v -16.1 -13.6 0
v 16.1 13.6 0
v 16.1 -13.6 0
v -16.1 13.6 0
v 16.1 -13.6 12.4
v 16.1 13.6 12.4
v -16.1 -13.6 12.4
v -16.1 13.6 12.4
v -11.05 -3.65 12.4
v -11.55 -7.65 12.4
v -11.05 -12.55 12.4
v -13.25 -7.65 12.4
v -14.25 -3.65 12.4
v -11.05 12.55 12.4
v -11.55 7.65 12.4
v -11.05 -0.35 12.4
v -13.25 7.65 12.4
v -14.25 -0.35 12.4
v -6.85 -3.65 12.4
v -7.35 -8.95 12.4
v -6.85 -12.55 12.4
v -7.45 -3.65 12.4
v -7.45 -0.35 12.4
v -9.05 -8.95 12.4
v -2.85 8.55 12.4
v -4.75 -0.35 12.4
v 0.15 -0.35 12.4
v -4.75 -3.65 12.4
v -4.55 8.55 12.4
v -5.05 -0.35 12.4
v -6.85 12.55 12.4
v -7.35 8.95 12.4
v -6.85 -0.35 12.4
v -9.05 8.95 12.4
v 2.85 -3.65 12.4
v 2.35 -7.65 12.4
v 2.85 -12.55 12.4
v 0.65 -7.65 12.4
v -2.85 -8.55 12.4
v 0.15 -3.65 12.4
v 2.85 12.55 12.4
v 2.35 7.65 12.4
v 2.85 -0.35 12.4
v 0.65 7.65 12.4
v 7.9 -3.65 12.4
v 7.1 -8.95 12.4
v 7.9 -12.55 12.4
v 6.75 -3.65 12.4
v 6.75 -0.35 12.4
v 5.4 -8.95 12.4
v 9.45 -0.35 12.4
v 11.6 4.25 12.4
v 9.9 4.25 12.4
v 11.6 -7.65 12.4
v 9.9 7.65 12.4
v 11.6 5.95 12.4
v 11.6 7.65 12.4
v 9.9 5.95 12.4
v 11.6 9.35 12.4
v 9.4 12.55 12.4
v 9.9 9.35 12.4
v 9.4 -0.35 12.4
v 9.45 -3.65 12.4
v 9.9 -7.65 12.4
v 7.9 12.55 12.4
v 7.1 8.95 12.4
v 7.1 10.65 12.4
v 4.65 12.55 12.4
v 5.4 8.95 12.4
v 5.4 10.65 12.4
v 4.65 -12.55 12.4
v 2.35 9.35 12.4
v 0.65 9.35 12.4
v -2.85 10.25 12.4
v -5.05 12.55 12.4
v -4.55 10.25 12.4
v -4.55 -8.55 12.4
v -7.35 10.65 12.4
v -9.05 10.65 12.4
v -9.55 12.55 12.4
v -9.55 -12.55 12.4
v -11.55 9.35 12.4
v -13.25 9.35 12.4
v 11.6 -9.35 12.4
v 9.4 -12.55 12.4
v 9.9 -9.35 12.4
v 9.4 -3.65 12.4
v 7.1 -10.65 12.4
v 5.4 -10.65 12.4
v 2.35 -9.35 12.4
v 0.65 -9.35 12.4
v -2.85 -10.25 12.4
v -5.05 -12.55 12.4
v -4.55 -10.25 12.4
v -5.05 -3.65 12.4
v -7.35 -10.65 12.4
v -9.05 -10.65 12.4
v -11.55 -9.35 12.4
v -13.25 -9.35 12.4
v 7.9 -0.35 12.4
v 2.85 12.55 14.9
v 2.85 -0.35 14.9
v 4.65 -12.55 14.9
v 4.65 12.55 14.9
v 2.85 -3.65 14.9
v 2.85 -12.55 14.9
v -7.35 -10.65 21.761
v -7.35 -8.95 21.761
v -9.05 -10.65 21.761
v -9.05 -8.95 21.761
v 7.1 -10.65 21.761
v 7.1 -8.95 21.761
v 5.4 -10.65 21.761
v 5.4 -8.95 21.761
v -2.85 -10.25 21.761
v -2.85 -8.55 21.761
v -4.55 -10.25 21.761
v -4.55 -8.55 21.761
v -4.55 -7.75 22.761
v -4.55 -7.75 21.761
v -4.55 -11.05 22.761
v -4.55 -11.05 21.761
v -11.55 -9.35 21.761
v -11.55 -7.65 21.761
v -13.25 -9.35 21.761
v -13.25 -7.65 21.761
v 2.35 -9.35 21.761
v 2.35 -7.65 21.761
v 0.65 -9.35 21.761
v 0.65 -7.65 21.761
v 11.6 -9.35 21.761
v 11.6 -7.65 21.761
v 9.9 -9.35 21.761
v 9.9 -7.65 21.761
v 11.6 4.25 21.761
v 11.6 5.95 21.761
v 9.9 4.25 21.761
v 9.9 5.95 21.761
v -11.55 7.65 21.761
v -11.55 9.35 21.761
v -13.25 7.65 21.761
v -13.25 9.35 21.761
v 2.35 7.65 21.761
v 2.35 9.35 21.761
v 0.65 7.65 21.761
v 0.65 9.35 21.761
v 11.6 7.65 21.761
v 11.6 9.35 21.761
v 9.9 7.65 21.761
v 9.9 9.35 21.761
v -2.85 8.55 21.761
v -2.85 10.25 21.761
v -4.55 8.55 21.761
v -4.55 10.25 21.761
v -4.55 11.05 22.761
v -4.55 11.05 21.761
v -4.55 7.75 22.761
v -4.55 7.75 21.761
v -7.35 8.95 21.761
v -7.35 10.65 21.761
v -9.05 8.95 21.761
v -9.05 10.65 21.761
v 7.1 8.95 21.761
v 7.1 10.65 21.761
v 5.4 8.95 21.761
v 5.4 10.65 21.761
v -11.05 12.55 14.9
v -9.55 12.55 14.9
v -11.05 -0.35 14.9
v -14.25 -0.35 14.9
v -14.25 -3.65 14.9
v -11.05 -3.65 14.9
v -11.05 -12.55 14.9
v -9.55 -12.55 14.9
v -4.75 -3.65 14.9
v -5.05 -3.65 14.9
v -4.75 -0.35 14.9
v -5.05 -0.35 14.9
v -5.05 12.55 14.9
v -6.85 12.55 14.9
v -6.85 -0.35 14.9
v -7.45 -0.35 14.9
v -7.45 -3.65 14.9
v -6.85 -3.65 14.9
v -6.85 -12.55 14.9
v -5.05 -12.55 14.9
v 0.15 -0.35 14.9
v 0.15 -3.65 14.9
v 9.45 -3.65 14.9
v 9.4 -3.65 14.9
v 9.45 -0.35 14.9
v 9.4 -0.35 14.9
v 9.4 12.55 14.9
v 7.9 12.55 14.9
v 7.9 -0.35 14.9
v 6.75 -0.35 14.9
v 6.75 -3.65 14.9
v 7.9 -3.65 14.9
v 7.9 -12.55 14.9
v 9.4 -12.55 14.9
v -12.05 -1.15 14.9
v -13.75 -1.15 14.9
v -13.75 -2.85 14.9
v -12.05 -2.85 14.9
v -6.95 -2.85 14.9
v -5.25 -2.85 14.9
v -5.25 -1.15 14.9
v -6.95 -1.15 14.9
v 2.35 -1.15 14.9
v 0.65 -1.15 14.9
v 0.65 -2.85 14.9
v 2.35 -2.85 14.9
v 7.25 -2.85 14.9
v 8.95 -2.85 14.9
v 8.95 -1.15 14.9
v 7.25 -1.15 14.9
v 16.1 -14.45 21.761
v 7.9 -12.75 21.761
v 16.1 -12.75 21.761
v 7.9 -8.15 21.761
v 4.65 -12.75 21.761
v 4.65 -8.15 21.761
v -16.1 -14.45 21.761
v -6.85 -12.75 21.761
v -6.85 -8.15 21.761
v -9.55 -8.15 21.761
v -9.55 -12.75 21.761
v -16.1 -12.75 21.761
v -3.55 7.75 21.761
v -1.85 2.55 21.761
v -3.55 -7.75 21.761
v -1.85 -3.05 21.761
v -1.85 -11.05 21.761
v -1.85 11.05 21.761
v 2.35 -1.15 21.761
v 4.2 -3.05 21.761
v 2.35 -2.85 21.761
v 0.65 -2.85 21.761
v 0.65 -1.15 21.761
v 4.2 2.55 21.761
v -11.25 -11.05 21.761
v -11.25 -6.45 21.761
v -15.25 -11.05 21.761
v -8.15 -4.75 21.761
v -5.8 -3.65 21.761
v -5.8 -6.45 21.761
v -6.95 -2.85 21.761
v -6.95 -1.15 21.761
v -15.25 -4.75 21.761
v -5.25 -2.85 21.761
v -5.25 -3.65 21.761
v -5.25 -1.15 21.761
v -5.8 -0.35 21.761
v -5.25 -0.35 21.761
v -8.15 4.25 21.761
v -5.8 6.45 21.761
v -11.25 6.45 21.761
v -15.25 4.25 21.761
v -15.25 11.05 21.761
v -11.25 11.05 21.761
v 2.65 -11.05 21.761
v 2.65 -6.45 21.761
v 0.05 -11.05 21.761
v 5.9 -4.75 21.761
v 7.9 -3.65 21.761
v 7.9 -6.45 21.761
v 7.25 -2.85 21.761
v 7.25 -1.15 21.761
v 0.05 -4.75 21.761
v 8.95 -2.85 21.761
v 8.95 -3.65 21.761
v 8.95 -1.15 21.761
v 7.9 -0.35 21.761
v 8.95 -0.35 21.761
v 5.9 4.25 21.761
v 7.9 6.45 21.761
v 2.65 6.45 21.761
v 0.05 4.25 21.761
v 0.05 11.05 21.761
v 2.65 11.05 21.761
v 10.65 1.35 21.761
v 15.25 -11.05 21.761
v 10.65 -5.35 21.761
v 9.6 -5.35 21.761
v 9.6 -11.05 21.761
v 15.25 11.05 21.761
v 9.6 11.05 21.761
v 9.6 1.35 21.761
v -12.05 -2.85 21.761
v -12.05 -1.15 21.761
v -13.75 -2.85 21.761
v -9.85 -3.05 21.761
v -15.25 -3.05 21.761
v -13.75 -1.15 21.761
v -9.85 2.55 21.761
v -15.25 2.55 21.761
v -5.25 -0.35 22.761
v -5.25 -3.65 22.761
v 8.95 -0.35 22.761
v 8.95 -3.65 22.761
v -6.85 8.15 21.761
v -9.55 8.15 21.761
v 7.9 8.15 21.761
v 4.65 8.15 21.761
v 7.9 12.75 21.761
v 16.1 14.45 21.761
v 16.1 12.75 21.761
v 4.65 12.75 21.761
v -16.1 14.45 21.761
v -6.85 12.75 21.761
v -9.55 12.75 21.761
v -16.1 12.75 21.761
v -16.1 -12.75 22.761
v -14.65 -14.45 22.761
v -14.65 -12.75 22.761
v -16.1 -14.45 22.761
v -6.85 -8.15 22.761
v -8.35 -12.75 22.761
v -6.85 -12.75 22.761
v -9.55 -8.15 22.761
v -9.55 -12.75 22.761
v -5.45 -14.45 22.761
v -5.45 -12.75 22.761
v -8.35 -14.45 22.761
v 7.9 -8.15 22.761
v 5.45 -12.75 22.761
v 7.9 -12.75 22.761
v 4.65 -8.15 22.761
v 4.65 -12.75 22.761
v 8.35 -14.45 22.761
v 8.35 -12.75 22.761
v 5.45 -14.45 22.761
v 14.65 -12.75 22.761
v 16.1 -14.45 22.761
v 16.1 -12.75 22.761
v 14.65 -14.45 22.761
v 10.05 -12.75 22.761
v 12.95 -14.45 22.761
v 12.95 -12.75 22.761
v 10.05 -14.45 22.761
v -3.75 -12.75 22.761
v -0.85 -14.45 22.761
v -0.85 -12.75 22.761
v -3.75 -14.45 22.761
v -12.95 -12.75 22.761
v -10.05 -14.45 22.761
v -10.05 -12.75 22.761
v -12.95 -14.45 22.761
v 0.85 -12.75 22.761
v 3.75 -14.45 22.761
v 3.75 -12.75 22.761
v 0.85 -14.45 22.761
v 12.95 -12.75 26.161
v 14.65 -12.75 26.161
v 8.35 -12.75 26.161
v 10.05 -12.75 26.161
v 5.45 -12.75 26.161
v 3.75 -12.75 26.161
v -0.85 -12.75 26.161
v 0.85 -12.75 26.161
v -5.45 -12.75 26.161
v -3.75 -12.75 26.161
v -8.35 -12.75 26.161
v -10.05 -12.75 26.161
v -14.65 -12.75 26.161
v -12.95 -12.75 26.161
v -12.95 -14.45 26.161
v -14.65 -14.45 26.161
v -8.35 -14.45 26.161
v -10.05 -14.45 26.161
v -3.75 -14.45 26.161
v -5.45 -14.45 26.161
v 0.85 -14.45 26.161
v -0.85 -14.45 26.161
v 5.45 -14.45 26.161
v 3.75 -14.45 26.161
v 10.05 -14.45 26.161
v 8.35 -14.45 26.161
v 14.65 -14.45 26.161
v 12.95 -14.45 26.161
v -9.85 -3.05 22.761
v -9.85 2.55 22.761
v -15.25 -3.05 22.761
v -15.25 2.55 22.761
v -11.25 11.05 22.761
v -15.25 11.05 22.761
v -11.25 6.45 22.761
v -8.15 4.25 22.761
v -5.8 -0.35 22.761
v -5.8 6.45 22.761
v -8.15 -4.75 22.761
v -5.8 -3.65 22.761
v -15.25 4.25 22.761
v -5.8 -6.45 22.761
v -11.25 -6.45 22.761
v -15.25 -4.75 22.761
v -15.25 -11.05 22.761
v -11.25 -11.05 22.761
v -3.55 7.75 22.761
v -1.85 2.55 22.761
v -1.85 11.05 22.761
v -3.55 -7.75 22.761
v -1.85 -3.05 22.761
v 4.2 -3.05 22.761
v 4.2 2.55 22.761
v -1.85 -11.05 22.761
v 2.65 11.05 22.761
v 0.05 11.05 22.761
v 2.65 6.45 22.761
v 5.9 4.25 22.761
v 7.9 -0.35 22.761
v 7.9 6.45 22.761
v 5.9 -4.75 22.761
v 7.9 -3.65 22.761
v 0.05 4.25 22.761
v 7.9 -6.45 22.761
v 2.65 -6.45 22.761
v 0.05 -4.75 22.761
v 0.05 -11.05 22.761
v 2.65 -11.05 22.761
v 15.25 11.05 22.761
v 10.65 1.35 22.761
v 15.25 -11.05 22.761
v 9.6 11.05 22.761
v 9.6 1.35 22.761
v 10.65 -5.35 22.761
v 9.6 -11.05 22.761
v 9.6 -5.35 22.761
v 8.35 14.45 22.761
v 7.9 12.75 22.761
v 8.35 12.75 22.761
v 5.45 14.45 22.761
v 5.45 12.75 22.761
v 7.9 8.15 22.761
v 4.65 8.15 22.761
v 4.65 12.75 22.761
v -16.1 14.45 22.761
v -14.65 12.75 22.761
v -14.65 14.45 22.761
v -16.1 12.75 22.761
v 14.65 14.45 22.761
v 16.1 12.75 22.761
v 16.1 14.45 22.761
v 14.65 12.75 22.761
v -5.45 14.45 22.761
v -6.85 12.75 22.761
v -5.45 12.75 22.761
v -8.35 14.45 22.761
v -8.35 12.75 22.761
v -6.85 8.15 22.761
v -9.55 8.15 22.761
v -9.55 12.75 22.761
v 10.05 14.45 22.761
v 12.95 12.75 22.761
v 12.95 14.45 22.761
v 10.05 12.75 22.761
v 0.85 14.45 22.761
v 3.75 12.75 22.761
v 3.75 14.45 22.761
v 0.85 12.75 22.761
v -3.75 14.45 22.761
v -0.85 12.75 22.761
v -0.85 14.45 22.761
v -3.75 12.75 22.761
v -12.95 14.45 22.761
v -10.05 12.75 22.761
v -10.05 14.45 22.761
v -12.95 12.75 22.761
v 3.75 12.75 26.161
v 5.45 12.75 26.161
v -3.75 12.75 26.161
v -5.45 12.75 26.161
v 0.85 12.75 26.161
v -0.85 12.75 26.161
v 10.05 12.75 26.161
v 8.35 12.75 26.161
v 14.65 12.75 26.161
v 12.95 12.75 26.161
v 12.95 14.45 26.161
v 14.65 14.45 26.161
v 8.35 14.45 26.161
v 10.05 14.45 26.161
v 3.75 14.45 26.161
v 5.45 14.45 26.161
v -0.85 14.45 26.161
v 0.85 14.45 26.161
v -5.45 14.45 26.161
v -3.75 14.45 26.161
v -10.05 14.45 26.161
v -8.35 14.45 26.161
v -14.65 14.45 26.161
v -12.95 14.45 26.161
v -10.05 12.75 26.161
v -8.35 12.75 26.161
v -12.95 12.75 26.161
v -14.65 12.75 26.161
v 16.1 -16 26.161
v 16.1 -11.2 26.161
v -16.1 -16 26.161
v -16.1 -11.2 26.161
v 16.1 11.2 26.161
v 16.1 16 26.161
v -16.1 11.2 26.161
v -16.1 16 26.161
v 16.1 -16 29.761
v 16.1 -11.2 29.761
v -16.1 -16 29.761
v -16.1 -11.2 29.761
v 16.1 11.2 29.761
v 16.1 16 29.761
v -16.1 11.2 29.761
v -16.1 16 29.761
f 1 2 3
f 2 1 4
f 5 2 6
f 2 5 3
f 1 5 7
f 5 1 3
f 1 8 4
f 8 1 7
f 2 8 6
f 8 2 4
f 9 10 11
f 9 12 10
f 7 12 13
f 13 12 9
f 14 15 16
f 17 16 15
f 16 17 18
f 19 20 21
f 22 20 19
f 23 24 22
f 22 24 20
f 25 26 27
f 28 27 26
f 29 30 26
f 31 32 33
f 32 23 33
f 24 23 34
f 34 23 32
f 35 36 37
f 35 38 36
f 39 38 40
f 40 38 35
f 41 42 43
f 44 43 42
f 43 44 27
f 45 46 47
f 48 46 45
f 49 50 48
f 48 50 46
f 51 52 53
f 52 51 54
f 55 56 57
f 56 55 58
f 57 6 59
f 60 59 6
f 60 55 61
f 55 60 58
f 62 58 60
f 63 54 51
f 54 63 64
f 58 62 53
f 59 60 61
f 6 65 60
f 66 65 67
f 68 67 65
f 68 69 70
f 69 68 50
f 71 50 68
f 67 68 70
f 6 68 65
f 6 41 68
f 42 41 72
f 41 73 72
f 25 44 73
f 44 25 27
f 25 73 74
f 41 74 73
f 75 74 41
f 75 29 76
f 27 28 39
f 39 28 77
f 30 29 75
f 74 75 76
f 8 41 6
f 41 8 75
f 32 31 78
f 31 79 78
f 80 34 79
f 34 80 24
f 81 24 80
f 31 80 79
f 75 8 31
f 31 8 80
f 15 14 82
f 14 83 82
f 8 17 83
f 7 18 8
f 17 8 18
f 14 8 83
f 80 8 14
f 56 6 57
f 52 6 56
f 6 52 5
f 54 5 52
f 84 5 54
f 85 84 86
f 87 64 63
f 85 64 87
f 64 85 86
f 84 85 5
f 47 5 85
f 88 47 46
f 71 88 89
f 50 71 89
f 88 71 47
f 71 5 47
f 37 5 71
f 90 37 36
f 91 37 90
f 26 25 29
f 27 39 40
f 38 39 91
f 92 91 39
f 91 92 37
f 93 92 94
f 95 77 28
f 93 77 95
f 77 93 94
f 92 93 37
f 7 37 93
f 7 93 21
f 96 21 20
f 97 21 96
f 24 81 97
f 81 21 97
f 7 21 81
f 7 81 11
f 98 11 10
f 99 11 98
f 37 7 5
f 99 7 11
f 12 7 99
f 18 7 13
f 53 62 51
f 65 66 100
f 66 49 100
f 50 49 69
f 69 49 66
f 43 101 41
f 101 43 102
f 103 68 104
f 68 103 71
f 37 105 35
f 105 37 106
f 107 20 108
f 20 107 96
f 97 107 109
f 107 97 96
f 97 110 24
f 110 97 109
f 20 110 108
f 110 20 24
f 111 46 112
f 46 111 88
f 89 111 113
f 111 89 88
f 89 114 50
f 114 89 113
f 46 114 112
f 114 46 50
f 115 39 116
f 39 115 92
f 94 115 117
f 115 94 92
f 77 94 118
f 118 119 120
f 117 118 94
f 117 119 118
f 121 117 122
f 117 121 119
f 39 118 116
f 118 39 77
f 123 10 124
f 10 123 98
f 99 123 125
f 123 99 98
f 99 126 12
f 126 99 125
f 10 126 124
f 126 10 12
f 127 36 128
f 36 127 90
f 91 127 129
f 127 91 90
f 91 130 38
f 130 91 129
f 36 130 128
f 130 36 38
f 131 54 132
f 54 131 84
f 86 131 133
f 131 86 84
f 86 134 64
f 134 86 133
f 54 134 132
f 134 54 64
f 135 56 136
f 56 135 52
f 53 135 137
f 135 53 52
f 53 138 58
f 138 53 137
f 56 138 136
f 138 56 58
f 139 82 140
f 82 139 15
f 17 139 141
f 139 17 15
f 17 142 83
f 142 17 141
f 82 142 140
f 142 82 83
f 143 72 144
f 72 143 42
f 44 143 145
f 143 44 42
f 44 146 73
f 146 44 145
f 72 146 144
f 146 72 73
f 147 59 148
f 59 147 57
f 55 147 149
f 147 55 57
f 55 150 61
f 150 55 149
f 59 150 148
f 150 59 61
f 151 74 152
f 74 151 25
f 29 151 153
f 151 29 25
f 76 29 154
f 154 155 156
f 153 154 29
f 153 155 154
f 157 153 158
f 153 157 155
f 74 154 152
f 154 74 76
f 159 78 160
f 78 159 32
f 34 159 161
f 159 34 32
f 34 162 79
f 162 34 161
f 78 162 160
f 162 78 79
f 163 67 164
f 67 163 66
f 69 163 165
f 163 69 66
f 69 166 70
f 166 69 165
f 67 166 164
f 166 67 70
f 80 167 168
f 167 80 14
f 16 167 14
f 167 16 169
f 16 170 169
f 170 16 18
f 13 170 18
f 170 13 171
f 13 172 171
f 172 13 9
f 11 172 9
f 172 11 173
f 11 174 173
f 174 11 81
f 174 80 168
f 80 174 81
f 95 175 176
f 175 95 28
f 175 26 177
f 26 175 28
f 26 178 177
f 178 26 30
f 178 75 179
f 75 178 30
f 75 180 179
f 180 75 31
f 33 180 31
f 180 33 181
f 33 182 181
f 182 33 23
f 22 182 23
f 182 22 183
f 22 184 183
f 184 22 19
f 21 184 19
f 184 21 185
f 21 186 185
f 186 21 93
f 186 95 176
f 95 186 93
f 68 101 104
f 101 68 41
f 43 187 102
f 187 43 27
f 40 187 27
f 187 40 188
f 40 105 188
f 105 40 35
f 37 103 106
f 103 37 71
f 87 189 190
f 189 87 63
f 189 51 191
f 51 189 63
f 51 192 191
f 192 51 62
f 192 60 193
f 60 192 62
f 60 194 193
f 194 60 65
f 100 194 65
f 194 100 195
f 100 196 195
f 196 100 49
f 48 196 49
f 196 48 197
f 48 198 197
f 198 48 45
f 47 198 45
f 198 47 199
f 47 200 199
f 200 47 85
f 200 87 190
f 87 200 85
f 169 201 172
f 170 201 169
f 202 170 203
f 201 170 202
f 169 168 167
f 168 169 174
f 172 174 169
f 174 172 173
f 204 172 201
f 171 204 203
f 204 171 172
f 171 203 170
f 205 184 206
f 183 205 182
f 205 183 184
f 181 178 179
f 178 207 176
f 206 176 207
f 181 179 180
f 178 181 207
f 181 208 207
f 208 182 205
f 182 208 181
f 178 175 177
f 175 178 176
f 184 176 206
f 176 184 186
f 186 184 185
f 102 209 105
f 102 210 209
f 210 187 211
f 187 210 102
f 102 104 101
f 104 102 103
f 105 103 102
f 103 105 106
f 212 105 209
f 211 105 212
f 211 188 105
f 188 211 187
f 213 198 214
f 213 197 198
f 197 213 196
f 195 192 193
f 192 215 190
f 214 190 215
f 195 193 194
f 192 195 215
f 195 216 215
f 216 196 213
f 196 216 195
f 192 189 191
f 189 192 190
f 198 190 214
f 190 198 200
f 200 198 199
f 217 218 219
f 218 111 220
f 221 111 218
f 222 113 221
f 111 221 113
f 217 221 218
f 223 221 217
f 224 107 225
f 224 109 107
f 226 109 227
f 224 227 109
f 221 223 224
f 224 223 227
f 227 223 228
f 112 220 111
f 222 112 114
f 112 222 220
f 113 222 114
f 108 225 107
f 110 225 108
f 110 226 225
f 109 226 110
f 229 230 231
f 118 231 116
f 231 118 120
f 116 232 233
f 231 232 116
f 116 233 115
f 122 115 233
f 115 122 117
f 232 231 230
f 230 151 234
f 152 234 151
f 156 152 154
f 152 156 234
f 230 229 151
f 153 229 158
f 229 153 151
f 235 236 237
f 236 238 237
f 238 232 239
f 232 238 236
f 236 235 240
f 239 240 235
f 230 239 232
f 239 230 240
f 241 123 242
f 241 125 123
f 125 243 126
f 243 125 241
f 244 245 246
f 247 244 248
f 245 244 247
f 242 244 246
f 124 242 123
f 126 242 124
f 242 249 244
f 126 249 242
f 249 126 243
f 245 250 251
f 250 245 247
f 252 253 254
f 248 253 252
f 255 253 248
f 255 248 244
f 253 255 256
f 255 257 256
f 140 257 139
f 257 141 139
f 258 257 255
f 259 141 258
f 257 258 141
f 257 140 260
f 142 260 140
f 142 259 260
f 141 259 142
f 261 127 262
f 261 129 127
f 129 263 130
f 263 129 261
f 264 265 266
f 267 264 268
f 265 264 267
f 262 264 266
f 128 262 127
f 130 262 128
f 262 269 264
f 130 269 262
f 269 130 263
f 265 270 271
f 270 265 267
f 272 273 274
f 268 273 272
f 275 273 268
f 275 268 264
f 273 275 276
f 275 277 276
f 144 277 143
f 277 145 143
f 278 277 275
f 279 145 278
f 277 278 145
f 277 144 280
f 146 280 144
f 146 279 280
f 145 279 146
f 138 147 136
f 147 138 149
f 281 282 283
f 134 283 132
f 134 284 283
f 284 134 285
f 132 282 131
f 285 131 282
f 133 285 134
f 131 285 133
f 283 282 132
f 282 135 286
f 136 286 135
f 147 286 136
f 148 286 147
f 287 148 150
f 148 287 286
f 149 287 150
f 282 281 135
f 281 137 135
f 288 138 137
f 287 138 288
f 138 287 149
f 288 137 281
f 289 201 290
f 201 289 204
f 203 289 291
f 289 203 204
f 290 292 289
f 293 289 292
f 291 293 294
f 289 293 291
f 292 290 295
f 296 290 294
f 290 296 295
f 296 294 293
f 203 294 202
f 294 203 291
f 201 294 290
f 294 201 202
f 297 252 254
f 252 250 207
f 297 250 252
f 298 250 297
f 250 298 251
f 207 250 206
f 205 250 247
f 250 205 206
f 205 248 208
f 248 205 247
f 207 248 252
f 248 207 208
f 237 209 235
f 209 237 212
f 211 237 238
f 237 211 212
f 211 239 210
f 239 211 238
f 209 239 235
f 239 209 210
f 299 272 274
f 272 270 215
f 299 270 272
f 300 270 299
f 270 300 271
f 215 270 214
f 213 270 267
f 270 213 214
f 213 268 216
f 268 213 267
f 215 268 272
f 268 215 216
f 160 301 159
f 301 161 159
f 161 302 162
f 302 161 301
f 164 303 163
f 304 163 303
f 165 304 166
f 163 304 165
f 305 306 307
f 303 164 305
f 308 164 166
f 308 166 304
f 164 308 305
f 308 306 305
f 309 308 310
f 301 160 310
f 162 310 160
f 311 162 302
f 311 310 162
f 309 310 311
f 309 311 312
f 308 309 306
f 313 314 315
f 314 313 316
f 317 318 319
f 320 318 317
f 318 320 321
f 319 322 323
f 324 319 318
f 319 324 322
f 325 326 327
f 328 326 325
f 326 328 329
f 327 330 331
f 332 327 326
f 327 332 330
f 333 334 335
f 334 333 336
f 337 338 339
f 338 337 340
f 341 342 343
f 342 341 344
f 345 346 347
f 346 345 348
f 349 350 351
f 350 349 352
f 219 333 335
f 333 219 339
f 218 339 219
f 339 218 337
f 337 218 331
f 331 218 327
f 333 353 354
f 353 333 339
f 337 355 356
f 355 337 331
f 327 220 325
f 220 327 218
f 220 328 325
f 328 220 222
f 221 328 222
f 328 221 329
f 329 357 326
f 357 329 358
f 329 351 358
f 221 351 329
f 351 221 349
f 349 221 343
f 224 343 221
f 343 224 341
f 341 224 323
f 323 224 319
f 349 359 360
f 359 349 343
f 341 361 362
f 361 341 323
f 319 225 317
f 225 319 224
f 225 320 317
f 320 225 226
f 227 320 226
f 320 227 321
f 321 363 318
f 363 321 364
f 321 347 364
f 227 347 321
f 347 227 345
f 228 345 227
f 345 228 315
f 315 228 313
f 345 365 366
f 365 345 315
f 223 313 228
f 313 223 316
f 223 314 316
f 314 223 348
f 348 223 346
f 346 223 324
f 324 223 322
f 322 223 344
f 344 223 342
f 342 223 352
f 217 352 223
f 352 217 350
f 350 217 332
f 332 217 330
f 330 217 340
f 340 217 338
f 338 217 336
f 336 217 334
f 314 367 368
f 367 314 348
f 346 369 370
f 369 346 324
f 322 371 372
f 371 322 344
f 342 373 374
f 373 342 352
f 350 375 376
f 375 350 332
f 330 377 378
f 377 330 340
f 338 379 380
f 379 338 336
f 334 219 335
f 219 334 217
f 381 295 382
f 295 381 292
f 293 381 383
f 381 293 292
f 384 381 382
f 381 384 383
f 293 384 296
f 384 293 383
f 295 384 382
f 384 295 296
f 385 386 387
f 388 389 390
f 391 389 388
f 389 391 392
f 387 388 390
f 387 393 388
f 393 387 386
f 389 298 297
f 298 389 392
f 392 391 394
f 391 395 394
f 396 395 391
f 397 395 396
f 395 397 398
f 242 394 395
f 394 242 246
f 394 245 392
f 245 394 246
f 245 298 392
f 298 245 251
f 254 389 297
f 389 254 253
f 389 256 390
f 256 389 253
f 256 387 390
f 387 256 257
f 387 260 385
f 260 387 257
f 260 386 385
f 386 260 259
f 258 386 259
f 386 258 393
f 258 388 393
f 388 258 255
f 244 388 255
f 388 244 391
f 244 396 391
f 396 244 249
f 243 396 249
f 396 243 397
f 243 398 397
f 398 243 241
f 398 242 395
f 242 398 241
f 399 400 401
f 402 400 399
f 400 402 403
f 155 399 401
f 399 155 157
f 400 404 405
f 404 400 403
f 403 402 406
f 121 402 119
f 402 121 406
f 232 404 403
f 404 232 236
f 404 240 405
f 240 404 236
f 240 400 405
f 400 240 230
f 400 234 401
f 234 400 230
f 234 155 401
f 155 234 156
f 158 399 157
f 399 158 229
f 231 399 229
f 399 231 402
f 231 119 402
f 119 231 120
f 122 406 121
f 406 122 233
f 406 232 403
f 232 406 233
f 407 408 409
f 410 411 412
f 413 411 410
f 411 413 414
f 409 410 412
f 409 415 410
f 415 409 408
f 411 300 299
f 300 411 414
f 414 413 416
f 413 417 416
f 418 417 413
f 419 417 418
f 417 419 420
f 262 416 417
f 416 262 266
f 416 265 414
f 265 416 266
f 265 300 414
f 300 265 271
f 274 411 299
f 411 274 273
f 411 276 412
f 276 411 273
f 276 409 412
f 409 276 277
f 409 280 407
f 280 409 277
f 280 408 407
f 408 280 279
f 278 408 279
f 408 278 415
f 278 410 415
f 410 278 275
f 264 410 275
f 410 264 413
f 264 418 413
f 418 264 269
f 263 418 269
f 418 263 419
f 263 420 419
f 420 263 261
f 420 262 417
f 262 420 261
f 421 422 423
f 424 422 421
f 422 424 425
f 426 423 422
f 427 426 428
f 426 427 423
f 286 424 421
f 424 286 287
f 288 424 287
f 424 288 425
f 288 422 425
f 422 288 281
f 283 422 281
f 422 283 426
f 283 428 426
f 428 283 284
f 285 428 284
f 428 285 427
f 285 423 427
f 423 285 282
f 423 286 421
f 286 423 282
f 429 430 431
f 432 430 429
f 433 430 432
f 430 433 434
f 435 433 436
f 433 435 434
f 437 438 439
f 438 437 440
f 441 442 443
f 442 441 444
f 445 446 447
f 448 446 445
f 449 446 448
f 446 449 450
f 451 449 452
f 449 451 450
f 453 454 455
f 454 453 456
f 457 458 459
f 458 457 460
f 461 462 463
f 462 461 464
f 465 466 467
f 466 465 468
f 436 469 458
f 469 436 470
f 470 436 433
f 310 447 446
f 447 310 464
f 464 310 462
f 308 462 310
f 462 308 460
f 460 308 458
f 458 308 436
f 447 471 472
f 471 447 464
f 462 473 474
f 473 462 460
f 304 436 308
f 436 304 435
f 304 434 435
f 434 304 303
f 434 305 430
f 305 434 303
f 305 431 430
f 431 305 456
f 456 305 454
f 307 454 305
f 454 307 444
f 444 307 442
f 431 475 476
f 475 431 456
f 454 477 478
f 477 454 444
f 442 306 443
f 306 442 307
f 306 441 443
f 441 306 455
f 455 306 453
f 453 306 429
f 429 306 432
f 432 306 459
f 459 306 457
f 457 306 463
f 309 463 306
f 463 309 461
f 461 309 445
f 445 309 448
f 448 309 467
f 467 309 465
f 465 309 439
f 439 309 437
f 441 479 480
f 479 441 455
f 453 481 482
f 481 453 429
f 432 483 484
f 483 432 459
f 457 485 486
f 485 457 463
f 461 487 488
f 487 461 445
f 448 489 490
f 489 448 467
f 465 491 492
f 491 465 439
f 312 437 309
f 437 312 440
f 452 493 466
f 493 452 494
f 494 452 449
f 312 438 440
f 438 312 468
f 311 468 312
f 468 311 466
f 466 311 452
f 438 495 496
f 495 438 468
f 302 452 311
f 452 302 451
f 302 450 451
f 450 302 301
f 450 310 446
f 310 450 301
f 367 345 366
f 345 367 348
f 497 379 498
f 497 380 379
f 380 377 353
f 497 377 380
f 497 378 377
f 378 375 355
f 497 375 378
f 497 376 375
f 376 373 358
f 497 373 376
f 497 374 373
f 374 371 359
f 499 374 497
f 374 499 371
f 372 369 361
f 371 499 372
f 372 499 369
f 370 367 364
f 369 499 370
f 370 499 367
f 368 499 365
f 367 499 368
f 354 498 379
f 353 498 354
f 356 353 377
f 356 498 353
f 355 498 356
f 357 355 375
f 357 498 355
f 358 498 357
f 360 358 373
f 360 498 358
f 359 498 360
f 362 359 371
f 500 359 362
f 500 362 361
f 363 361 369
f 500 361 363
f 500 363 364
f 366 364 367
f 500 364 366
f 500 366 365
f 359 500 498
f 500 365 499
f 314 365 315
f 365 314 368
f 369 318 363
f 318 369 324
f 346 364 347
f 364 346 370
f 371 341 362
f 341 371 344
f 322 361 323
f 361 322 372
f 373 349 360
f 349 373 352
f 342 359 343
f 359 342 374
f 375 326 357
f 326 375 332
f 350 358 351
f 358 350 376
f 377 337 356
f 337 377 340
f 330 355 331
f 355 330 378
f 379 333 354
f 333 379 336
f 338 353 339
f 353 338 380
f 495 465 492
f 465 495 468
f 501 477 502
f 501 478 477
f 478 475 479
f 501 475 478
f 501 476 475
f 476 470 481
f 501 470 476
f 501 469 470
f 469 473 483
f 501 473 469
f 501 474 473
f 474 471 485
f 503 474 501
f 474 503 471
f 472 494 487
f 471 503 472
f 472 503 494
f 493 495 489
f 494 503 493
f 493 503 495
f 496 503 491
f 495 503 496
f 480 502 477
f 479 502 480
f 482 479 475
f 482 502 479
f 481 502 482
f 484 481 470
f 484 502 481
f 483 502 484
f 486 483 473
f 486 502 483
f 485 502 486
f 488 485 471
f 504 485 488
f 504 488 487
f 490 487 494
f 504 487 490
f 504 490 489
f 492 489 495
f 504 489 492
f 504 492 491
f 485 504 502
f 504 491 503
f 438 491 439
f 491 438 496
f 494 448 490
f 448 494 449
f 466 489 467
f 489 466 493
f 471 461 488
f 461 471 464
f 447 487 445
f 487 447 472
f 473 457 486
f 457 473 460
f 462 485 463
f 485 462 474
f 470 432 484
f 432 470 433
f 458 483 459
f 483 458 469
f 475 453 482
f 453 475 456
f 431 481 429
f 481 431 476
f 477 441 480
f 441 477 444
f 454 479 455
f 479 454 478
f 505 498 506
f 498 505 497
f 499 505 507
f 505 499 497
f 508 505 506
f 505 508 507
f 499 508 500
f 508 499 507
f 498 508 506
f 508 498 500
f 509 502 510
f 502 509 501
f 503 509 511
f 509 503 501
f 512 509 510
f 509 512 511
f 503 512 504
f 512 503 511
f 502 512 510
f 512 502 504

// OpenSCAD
// Generated by SolidPython 0.4.2 on 2020-09-29 23:20:44
//!OpenSCAD

scale(v = 0.0100000000) {
	translate(v = [-1610, -1360, 0]) {
		union() {
			color(c = [0.4000000000, 0.4000000000, 0.4000000000]) {
				translate(v = [0, 0, 0]) {
					linear_extrude(height = 1000.0000000000) {
						polygon(paths = [[0, 1, 2, 3]], points = [[0, 0], [0, 2720], [3220, 2720], [3220, 0]]);
					}
				}
			}
			color(c = [0.2000000000, 0.6000000000, 0.2000000000]) {
				translate(v = [0, 0, 1000.0000000000]) {
					linear_extrude(height = 120.0000000000) {
						polygon(paths = [[0, 1, 2, 3]], points = [[0, 1305], [0, 2720], [3220, 2720], [3220, 1305]]);
					}
				}
			}
			color(c = [0.4000000000, 0.4000000000, 0.4000000000]) {
				translate(v = [0, 0, 1000.0000000000]) {
					linear_extrude(height = 120.0000000000) {
						polygon(paths = [[0, 1, 2, 3]], points = [[0, 0], [0, 1305], [3220, 1305], [3220, 0]]);
					}
				}
			}
			color(c = [0.9000000000, 0.6000000000, 0.6000000000]) {
				translate(v = [0, 0, 1120.0000000000]) {
					linear_extrude(height = 120.0000000000) {
						polygon(paths = [[0, 1, 2, 3]], points = [[245, 2065], [245, 2485], [505, 2485], [505, 2065]]);
					}
				}
			}
			color(c = [0.9000000000, 0.6000000000, 0.6000000000]) {
				translate(v = [0, 0, 1120.0000000000]) {
					linear_extrude(height = 120.0000000000) {
						polygon(paths = [[0, 1, 2, 3]], points = [[655, 2065], [655, 2485], [925, 2485], [925, 2065]]);
					}
				}
			}
			color(c = [0.9000000000, 0.6000000000, 0.6000000000]) {
				translate(v = [0, 0, 1120.0000000000]) {
					linear_extrude(height = 120.0000000000) {
						polygon(paths = [[0, 1, 2, 3]], points = [[1105, 2065], [1105, 2485], [1365, 2485], [1365, 2065]]);
					}
				}
			}
			color(c = [0.9000000000, 0.6000000000, 0.6000000000]) {
				translate(v = [0, 0, 1120.0000000000]) {
					linear_extrude(height = 120.0000000000) {
						polygon(paths = [[0, 1, 2, 3]], points = [[1635, 2065], [1635, 2485], [1895, 2485], [1895, 2065]]);
					}
				}
			}
			color(c = [0.9000000000, 0.6000000000, 0.6000000000]) {
				translate(v = [0, 0, 1120.0000000000]) {
					linear_extrude(height = 120.0000000000) {
						polygon(paths = [[0, 1, 2, 3, 4, 5]], points = [[2150, 1485], [2150, 2065], [2075, 2065], [2075, 2485], [2400, 2485], [2400, 1485]]);
					}
				}
			}
			color(c = [0.9000000000, 0.6000000000, 0.6000000000]) {
				translate(v = [0, 0, 1120.0000000000]) {
					linear_extrude(height = 120.0000000000) {
						polygon(paths = [[0, 1, 2, 3]], points = [[2550, 1485], [2550, 2485], [2810, 2485], [2810, 1485]]);
					}
				}
			}
			color(c = [0.9000000000, 0.6000000000, 0.9000000000]) {
				translate(v = [0, 0, 1120.0000000000]) {
					linear_extrude(height = 120.0000000000) {
						polygon(paths = [[0, 1, 2, 3]], points = [[245, 235], [245, 655], [505, 655], [505, 235]]);
					}
				}
			}
			color(c = [0.9000000000, 0.6000000000, 0.9000000000]) {
				translate(v = [0, 0, 1120.0000000000]) {
					linear_extrude(height = 120.0000000000) {
						polygon(paths = [[0, 1, 2, 3]], points = [[655, 235], [655, 655], [925, 655], [925, 235]]);
					}
				}
			}
			color(c = [0.9000000000, 0.6000000000, 0.9000000000]) {
				translate(v = [0, 0, 1120.0000000000]) {
					linear_extrude(height = 120.0000000000) {
						polygon(paths = [[0, 1, 2, 3]], points = [[1105, 235], [1105, 655], [1365, 655], [1365, 235]]);
					}
				}
			}
			color(c = [0.9000000000, 0.6000000000, 0.9000000000]) {
				translate(v = [0, 0, 1120.0000000000]) {
					linear_extrude(height = 120.0000000000) {
						polygon(paths = [[0, 1, 2, 3]], points = [[1635, 235], [1635, 655], [1895, 655], [1895, 235]]);
					}
				}
			}
			color(c = [0.9000000000, 0.6000000000, 0.9000000000]) {
				translate(v = [0, 0, 1120.0000000000]) {
					linear_extrude(height = 120.0000000000) {
						polygon(paths = [[0, 1, 2, 3, 4, 5]], points = [[2075, 235], [2075, 655], [2150, 655], [2150, 885], [2400, 885], [2400, 235]]);
					}
				}
			}
			color(c = [0.9000000000, 0.6000000000, 0.9000000000]) {
				translate(v = [0, 0, 1120.0000000000]) {
					linear_extrude(height = 120.0000000000) {
						polygon(paths = [[0, 1, 2, 3]], points = [[2550, 235], [2550, 885], [2810, 885], [2810, 235]]);
					}
				}
			}
			color(c = [0.2000000000, 0.6000000000, 0.2000000000]) {
				translate(v = [0, 0, 1120.0000000000]) {
					linear_extrude(height = 120.0000000000) {
						difference() {
							polygon(paths = [[0, 1, 2, 3]], points = [[0, 1305], [0, 2720], [3220, 2720], [3220, 1305]]);
							polygon(paths = [[0, 1, 2, 3]], points = [[2550, 1485], [2810, 1485], [2810, 2485], [2550, 2485]]);
							polygon(paths = [[0, 1, 2, 3]], points = [[245, 2065], [505, 2065], [505, 2485], [245, 2485]]);
							polygon(paths = [[0, 1, 2, 3]], points = [[655, 2065], [925, 2065], [925, 2485], [655, 2485]]);
							polygon(paths = [[0, 1, 2, 3]], points = [[1105, 2065], [1365, 2065], [1365, 2485], [1105, 2485]]);
							polygon(paths = [[0, 1, 2, 3]], points = [[1635, 2065], [1895, 2065], [1895, 2485], [1635, 2485]]);
							polygon(paths = [[0, 1, 2, 3, 4, 5]], points = [[2150, 1485], [2400, 1485], [2400, 2485], [2075, 2485], [2075, 2065], [2150, 2065]]);
						}
					}
				}
			}
			color(c = [0.4000000000, 0.4000000000, 0.4000000000]) {
				translate(v = [0, 0, 1120.0000000000]) {
					linear_extrude(height = 120.0000000000) {
						difference() {
							polygon(paths = [[0, 1, 2, 3]], points = [[0, 0], [0, 1305], [3220, 1305], [3220, 0]]);
							polygon(paths = [[0, 1, 2, 3]], points = [[245, 235], [505, 235], [505, 655], [245, 655]]);
							polygon(paths = [[0, 1, 2, 3]], points = [[655, 235], [925, 235], [925, 655], [655, 655]]);
							polygon(paths = [[0, 1, 2, 3]], points = [[1105, 235], [1365, 235], [1365, 655], [1105, 655]]);
							polygon(paths = [[0, 1, 2, 3]], points = [[1635, 235], [1895, 235], [1895, 655], [1635, 655]]);
							polygon(paths = [[0, 1, 2, 3]], points = [[2550, 235], [2810, 235], [2810, 885], [2550, 885]]);
							polygon(paths = [[0, 1, 2, 3, 4, 5]], points = [[2075, 235], [2400, 235], [2400, 885], [2150, 885], [2150, 655], [2075, 655]]);
						}
					}
				}
			}
			color(c = [0.1000000000, 0.1000000000, 0.1000000000]) {
				translate(v = [0, 0, 1240.0000000000]) {
					linear_extrude(height = 70.0000000000) {
						polygon(paths = [[0, 1, 2, 3]], points = [[705, 295], [705, 465], [875, 465], [875, 295]]);
					}
				}
			}
			color(c = [0.1000000000, 0.1000000000, 0.1000000000]) {
				translate(v = [0, 0, 1240.0000000000]) {
					linear_extrude(height = 70.0000000000) {
						polygon(paths = [[0, 1, 2, 3]], points = [[2150, 295], [2150, 465], [2320, 465], [2320, 295]]);
					}
				}
			}
			color(c = [0.1000000000, 0.1000000000, 0.1000000000]) {
				translate(v = [0, 0, 1240.0000000000]) {
					linear_extrude(height = 70.0000000000) {
						polygon(paths = [[0, 1, 2, 3]], points = [[1155, 335], [1155, 505], [1325, 505], [1325, 335]]);
					}
				}
			}
			color(c = [0.1000000000, 0.1000000000, 0.1000000000]) {
				translate(v = [0, 0, 1240.0000000000]) {
					linear_extrude(height = 70.0000000000) {
						polygon(paths = [[0, 1, 2, 3]], points = [[285, 425], [285, 595], [455, 595], [455, 425]]);
					}
				}
			}
			color(c = [0.1000000000, 0.1000000000, 0.1000000000]) {
				translate(v = [0, 0, 1240.0000000000]) {
					linear_extrude(height = 70.0000000000) {
						polygon(paths = [[0, 1, 2, 3]], points = [[1675, 425], [1675, 595], [1845, 595], [1845, 425]]);
					}
				}
			}
			color(c = [0.1000000000, 0.1000000000, 0.1000000000]) {
				translate(v = [0, 0, 1240.0000000000]) {
					linear_extrude(height = 70.0000000000) {
						polygon(paths = [[0, 1, 2, 3]], points = [[2600, 425], [2600, 595], [2770, 595], [2770, 425]]);
					}
				}
			}
			color(c = [0.1000000000, 0.1000000000, 0.1000000000]) {
				translate(v = [0, 0, 1240.0000000000]) {
					linear_extrude(height = 70.0000000000) {
						polygon(paths = [[0, 1, 2, 3]], points = [[2600, 1785], [2600, 1955], [2770, 1955], [2770, 1785]]);
					}
				}
			}
			color(c = [0.1000000000, 0.1000000000, 0.1000000000]) {
				translate(v = [0, 0, 1240.0000000000]) {
					linear_extrude(height = 70.0000000000) {
						polygon(paths = [[0, 1, 2, 3]], points = [[285, 2125], [285, 2295], [455, 2295], [455, 2125]]);
					}
				}
			}
			color(c = [0.1000000000, 0.1000000000, 0.1000000000]) {
				translate(v = [0, 0, 1240.0000000000]) {
					linear_extrude(height = 70.0000000000) {
						polygon(paths = [[0, 1, 2, 3]], points = [[1675, 2125], [1675, 2295], [1845, 2295], [1845, 2125]]);
					}
				}
			}
			color(c = [0.1000000000, 0.1000000000, 0.1000000000]) {
				translate(v = [0, 0, 1240.0000000000]) {
					linear_extrude(height = 70.0000000000) {
						polygon(paths = [[0, 1, 2, 3]], points = [[2600, 2125], [2600, 2295], [2770, 2295], [2770, 2125]]);
					}
				}
			}
			color(c = [0.1000000000, 0.1000000000, 0.1000000000]) {
				translate(v = [0, 0, 1240.0000000000]) {
					linear_extrude(height = 70.0000000000) {
						polygon(paths = [[0, 1, 2, 3]], points = [[1155, 2215], [1155, 2385], [1325, 2385], [1325, 2215]]);
					}
				}
			}
			color(c = [0.1000000000, 0.1000000000, 0.1000000000]) {
				translate(v = [0, 0, 1240.0000000000]) {
					linear_extrude(height = 70.0000000000) {
						polygon(paths = [[0, 1, 2, 3]], points = [[705, 2255], [705, 2425], [875, 2425], [875, 2255]]);
					}
				}
			}
			color(c = [0.1000000000, 0.1000000000, 0.1000000000]) {
				translate(v = [0, 0, 1240.0000000000]) {
					linear_extrude(height = 70.0000000000) {
						polygon(paths = [[0, 1, 2, 3]], points = [[2150, 2255], [2150, 2425], [2320, 2425], [2320, 2255]]);
					}
				}
			}
			color(c = [1.0000000000, 1.0000000000, 1.0000000000]) {
				translate(v = [0, 0, 1240.0000000000]) {
					linear_extrude(height = 70.0000000000) {
						polygon(paths = [[0, 1, 2, 3, 4, 5, 6, 7]], points = [[505, 105], [505, 995], [185, 995], [185, 1325], [505, 1325], [505, 2615], [655, 2615], [655, 105]]);
					}
				}
			}
			color(c = [1.0000000000, 1.0000000000, 1.0000000000]) {
				translate(v = [0, 0, 1240.0000000000]) {
					linear_extrude(height = 70.0000000000) {
						polygon(paths = [[0, 1, 2, 3, 4, 5, 6, 7, 8, 9, 10, 11]], points = [[925, 105], [925, 995], [865, 995], [865, 1325], [925, 1325], [925, 2615], [1105, 2615], [1105, 1325], [1135, 1325], [1135, 995], [1105, 995], [1105, 105]]);
					}
				}
			}
			color(c = [1.0000000000, 1.0000000000, 1.0000000000]) {
				translate(v = [0, 0, 1240.0000000000]) {
					linear_extrude(height = 70.0000000000) {
						polygon(paths = [[0, 1, 2, 3, 4, 5, 6, 7]], points = [[1895, 105], [1895, 995], [1625, 995], [1625, 1325], [1895, 1325], [1895, 2615], [2075, 2615], [2075, 105]]);
					}
				}
			}
			color(c = [1.0000000000, 1.0000000000, 1.0000000000]) {
				translate(v = [0, 0, 1240.0000000000]) {
					linear_extrude(height = 70.0000000000) {
						polygon(paths = [[0, 1, 2, 3, 4, 5, 6, 7, 8, 9, 10, 11]], points = [[2400, 105], [2400, 995], [2285, 995], [2285, 1325], [2400, 1325], [2400, 2615], [2550, 2615], [2550, 1325], [2555, 1325], [2555, 995], [2550, 995], [2550, 105]]);
					}
				}
			}
			color(c = [0.1000000000, 0.1000000000, 0.1000000000]) {
				translate(v = [0, 0, 1310.0000000000]) {
					linear_extrude(height = 180.0000000000) {
						polygon(paths = [[0, 1, 2, 3]], points = [[705, 295], [705, 465], [875, 465], [875, 295]]);
					}
				}
			}
			color(c = [0.1000000000, 0.1000000000, 0.1000000000]) {
				translate(v = [0, 0, 1310.0000000000]) {
					linear_extrude(height = 180.0000000000) {
						polygon(paths = [[0, 1, 2, 3]], points = [[2150, 295], [2150, 465], [2320, 465], [2320, 295]]);
					}
				}
			}
			color(c = [0.1000000000, 0.1000000000, 0.1000000000]) {
				translate(v = [0, 0, 1310.0000000000]) {
					linear_extrude(height = 180.0000000000) {
						polygon(paths = [[0, 1, 2, 3]], points = [[1155, 335], [1155, 505], [1325, 505], [1325, 335]]);
					}
				}
			}
			color(c = [0.1000000000, 0.1000000000, 0.1000000000]) {
				translate(v = [0, 0, 1310.0000000000]) {
					linear_extrude(height = 180.0000000000) {
						polygon(paths = [[0, 1, 2, 3]], points = [[285, 425], [285, 595], [455, 595], [455, 425]]);
					}
				}
			}
			color(c = [0.1000000000, 0.1000000000, 0.1000000000]) {
				translate(v = [0, 0, 1310.0000000000]) {
					linear_extrude(height = 180.0000000000) {
						polygon(paths = [[0, 1, 2, 3]], points = [[1675, 425], [1675, 595], [1845, 595], [1845, 425]]);
					}
				}
			}
			color(c = [0.1000000000, 0.1000000000, 0.1000000000]) {
				translate(v = [0, 0, 1310.0000000000]) {
					linear_extrude(height = 180.0000000000) {
						polygon(paths = [[0, 1, 2, 3]], points = [[2600, 425], [2600, 595], [2770, 595], [2770, 425]]);
					}
				}
			}
			color(c = [0.1000000000, 0.1000000000, 0.1000000000]) {
				translate(v = [0, 0, 1310.0000000000]) {
					linear_extrude(height = 180.0000000000) {
						polygon(paths = [[0, 1, 2, 3]], points = [[2600, 1785], [2600, 1955], [2770, 1955], [2770, 1785]]);
					}
				}
			}
			color(c = [0.1000000000, 0.1000000000, 0.1000000000]) {
				translate(v = [0, 0, 1310.0000000000]) {
					linear_extrude(height = 180.0000000000) {
						polygon(paths = [[0, 1, 2, 3]], points = [[285, 2125], [285, 2295], [455, 2295], [455, 2125]]);
					}
				}
			}
			color(c = [0.1000000000, 0.1000000000, 0.1000000000]) {
				translate(v = [0, 0, 1310.0000000000]) {
					linear_extrude(height = 180.0000000000) {
						polygon(paths = [[0, 1, 2, 3]], points = [[1675, 2125], [1675, 2295], [1845, 2295], [1845, 2125]]);
					}
				}
			}
			color(c = [0.1000000000, 0.1000000000, 0.1000000000]) {
				translate(v = [0, 0, 1310.0000000000]) {
					linear_extrude(height = 180.0000000000) {
						polygon(paths = [[0, 1, 2, 3]], points = [[2600, 2125], [2600, 2295], [2770, 2295], [2770, 2125]]);
					}
				}
			}
			color(c = [0.1000000000, 0.1000000000, 0.1000000000]) {
				translate(v = [0, 0, 1310.0000000000]) {
					linear_extrude(height = 180.0000000000) {
						polygon(paths = [[0, 1, 2, 3]], points = [[1155, 2215], [1155, 2385], [1325, 2385], [1325, 2215]]);
					}
				}
			}
			color(c = [0.1000000000, 0.1000000000, 0.1000000000]) {
				translate(v = [0, 0, 1310.0000000000]) {
					linear_extrude(height = 180.0000000000) {
						polygon(paths = [[0, 1, 2, 3]], points = [[705, 2255], [705, 2425], [875, 2425], [875, 2255]]);
					}
				}
			}
			color(c = [0.1000000000, 0.1000000000, 0.1000000000]) {
				translate(v = [0, 0, 1310.0000000000]) {
					linear_extrude(height = 180.0000000000) {
						polygon(paths = [[0, 1, 2, 3]], points = [[2150, 2255], [2150, 2425], [2320, 2425], [2320, 2255]]);
					}
				}
			}
			color(c = [0.7000000000, 0, 0]) {
				translate(v = [0, 0, 1310.0000000000]) {
					linear_extrude(height = 180.0000000000) {
						polygon(paths = [[0, 1, 2, 3, 4, 5, 6, 7]], points = [[505, 105], [505, 995], [185, 995], [185, 1325], [505, 1325], [505, 2615], [655, 2615], [655, 105]]);
					}
				}
			}
			color(c = [0.7000000000, 0, 0]) {
				translate(v = [0, 0, 1310.0000000000]) {
					linear_extrude(height = 180.0000000000) {
						polygon(paths = [[0, 1, 2, 3, 4, 5, 6, 7, 8, 9, 10, 11]], points = [[925, 105], [925, 995], [865, 995], [865, 1325], [925, 1325], [925, 2615], [1105, 2615], [1105, 1325], [1135, 1325], [1135, 995], [1105, 995], [1105, 105]]);
					}
				}
			}
			color(c = [0.7000000000, 0, 0]) {
				translate(v = [0, 0, 1310.0000000000]) {
					linear_extrude(height = 180.0000000000) {
						polygon(paths = [[0, 1, 2, 3, 4, 5, 6, 7]], points = [[1895, 105], [1895, 995], [1625, 995], [1625, 1325], [1895, 1325], [1895, 2615], [2075, 2615], [2075, 105]]);
					}
				}
			}
			color(c = [0.7000000000, 0, 0]) {
				translate(v = [0, 0, 1310.0000000000]) {
					linear_extrude(height = 180.0000000000) {
						polygon(paths = [[0, 1, 2, 3, 4, 5, 6, 7, 8, 9, 10, 11]], points = [[2400, 105], [2400, 995], [2285, 995], [2285, 1325], [2400, 1325], [2400, 2615], [2550, 2615], [2550, 1325], [2555, 1325], [2555, 995], [2550, 995], [2550, 105]]);
					}
				}
			}
			color(c = [0.1000000000, 0.1000000000, 0.1000000000]) {
				translate(v = [0, 0, 1490.0000000000]) {
					linear_extrude(height = 686.1000000000) {
						polygon(paths = [[0, 1, 2, 3]], points = [[705, 295], [705, 465], [875, 465], [875, 295]]);
					}
				}
			}
			color(c = [0.1000000000, 0.1000000000, 0.1000000000]) {
				translate(v = [0, 0, 1490.0000000000]) {
					linear_extrude(height = 686.1000000000) {
						polygon(paths = [[0, 1, 2, 3]], points = [[2150, 295], [2150, 465], [2320, 465], [2320, 295]]);
					}
				}
			}
			color(c = [0.1000000000, 0.1000000000, 0.1000000000]) {
				translate(v = [0, 0, 1490.0000000000]) {
					linear_extrude(height = 686.1000000000) {
						polygon(paths = [[0, 1, 2, 3]], points = [[1155, 335], [1155, 505], [1325, 505], [1325, 335]]);
					}
				}
			}
			color(c = [0.1000000000, 0.1000000000, 0.1000000000]) {
				translate(v = [0, 0, 1490.0000000000]) {
					linear_extrude(height = 686.1000000000) {
						polygon(paths = [[0, 1, 2, 3]], points = [[285, 425], [285, 595], [455, 595], [455, 425]]);
					}
				}
			}
			color(c = [0.1000000000, 0.1000000000, 0.1000000000]) {
				translate(v = [0, 0, 1490.0000000000]) {
					linear_extrude(height = 686.1000000000) {
						polygon(paths = [[0, 1, 2, 3]], points = [[1675, 425], [1675, 595], [1845, 595], [1845, 425]]);
					}
				}
			}
			color(c = [0.1000000000, 0.1000000000, 0.1000000000]) {
				translate(v = [0, 0, 1490.0000000000]) {
					linear_extrude(height = 686.1000000000) {
						polygon(paths = [[0, 1, 2, 3]], points = [[2600, 425], [2600, 595], [2770, 595], [2770, 425]]);
					}
				}
			}
			color(c = [0.1000000000, 0.1000000000, 0.1000000000]) {
				translate(v = [0, 0, 1490.0000000000]) {
					linear_extrude(height = 686.1000000000) {
						polygon(paths = [[0, 1, 2, 3]], points = [[235, 1075], [235, 1245], [405, 1245], [405, 1075]]);
					}
				}
			}
			color(c = [0.1000000000, 0.1000000000, 0.1000000000]) {
				translate(v = [0, 0, 1490.0000000000]) {
					linear_extrude(height = 686.1000000000) {
						polygon(paths = [[0, 1, 2, 3]], points = [[915, 1075], [915, 1245], [1085, 1245], [1085, 1075]]);
					}
				}
			}
			color(c = [0.1000000000, 0.1000000000, 0.1000000000]) {
				translate(v = [0, 0, 1490.0000000000]) {
					linear_extrude(height = 686.1000000000) {
						polygon(paths = [[0, 1, 2, 3]], points = [[1675, 1075], [1675, 1245], [1845, 1245], [1845, 1075]]);
					}
				}
			}
			color(c = [0.1000000000, 0.1000000000, 0.1000000000]) {
				translate(v = [0, 0, 1490.0000000000]) {
					linear_extrude(height = 686.1000000000) {
						polygon(paths = [[0, 1, 2, 3]], points = [[2335, 1075], [2335, 1245], [2505, 1245], [2505, 1075]]);
					}
				}
			}
			color(c = [0.1000000000, 0.1000000000, 0.1000000000]) {
				translate(v = [0, 0, 1490.0000000000]) {
					linear_extrude(height = 686.1000000000) {
						polygon(paths = [[0, 1, 2, 3]], points = [[2600, 1785], [2600, 1955], [2770, 1955], [2770, 1785]]);
					}
				}
			}
			color(c = [0.1000000000, 0.1000000000, 0.1000000000]) {
				translate(v = [0, 0, 1490.0000000000]) {
					linear_extrude(height = 686.1000000000) {
						polygon(paths = [[0, 1, 2, 3]], points = [[285, 2125], [285, 2295], [455, 2295], [455, 2125]]);
					}
				}
			}
			color(c = [0.1000000000, 0.1000000000, 0.1000000000]) {
				translate(v = [0, 0, 1490.0000000000]) {
					linear_extrude(height = 686.1000000000) {
						polygon(paths = [[0, 1, 2, 3]], points = [[1675, 2125], [1675, 2295], [1845, 2295], [1845, 2125]]);
					}
				}
			}
			color(c = [0.1000000000, 0.1000000000, 0.1000000000]) {
				translate(v = [0, 0, 1490.0000000000]) {
					linear_extrude(height = 686.1000000000) {
						polygon(paths = [[0, 1, 2, 3]], points = [[2600, 2125], [2600, 2295], [2770, 2295], [2770, 2125]]);
					}
				}
			}
			color(c = [0.1000000000, 0.1000000000, 0.1000000000]) {
				translate(v = [0, 0, 1490.0000000000]) {
					linear_extrude(height = 686.1000000000) {
						polygon(paths = [[0, 1, 2, 3]], points = [[1155, 2215], [1155, 2385], [1325, 2385], [1325, 2215]]);
					}
				}
			}
			color(c = [0.1000000000, 0.1000000000, 0.1000000000]) {
				translate(v = [0, 0, 1490.0000000000]) {
					linear_extrude(height = 686.1000000000) {
						polygon(paths = [[0, 1, 2, 3]], points = [[705, 2255], [705, 2425], [875, 2425], [875, 2255]]);
					}
				}
			}
			color(c = [0.1000000000, 0.1000000000, 0.1000000000]) {
				translate(v = [0, 0, 1490.0000000000]) {
					linear_extrude(height = 686.1000000000) {
						polygon(paths = [[0, 1, 2, 3]], points = [[2150, 2255], [2150, 2425], [2320, 2425], [2320, 2255]]);
					}
				}
			}
			color(c = [0.9000000000, 0.6000000000, 0.6000000000]) {
				translate(v = [0, 0, 2176.1000000000]) {
					linear_extrude(height = 100.0000000000) {
						polygon(paths = [[0, 1, 2, 3, 4, 5, 6, 7, 8, 9, 10, 11]], points = [[0, -85], [0, 85], [655, 85], [655, 545], [925, 545], [925, 85], [2075, 85], [2075, 545], [2400, 545], [2400, 85], [3220, 85], [3220, -85]]);
					}
				}
			}
			color(c = [0.9000000000, 0.6000000000, 0.6000000000]) {
				translate(v = [0, 0, 2176.1000000000]) {
					linear_extrude(height = 100.0000000000) {
						polygon(paths = [[0, 1, 2, 3]], points = [[85, 1055], [85, 1615], [625, 1615], [625, 1055]]);
					}
				}
			}
			color(c = [0.9000000000, 0.6000000000, 0.6000000000]) {
				translate(v = [0, 0, 2176.1000000000]) {
					linear_extrude(height = 100.0000000000) {
						polygon(paths = [[0, 1, 2, 3, 4, 5, 6, 7, 8, 9, 10, 11, 12, 13, 14, 15]], points = [[85, 255], [85, 885], [795, 885], [795, 1785], [85, 1785], [85, 2465], [485, 2465], [485, 2005], [1030, 2005], [1030, 1325], [1085, 1325], [1085, 995], [1030, 995], [1030, 715], [485, 715], [485, 255]]);
					}
				}
			}
			color(c = [0.9000000000, 0.6000000000, 0.6000000000]) {
				translate(v = [0, 0, 2176.1000000000]) {
					linear_extrude(height = 100.0000000000) {
						polygon(paths = [[0, 1, 2, 3, 4, 5, 6, 7, 8, 9, 10, 11]], points = [[1155, 255], [1155, 585], [1255, 585], [1255, 2135], [1155, 2135], [1155, 2465], [1425, 2465], [1425, 1615], [2030, 1615], [2030, 1055], [1425, 1055], [1425, 255]]);
					}
				}
			}
			color(c = [0.9000000000, 0.6000000000, 0.6000000000]) {
				translate(v = [0, 0, 2176.1000000000]) {
					linear_extrude(height = 100.0000000000) {
						polygon(paths = [[0, 1, 2, 3, 4, 5, 6, 7, 8, 9, 10, 11, 12, 13, 14, 15]], points = [[1615, 255], [1615, 885], [2200, 885], [2200, 1785], [1615, 1785], [1615, 2465], [1875, 2465], [1875, 2005], [2400, 2005], [2400, 1325], [2505, 1325], [2505, 995], [2400, 995], [2400, 715], [1875, 715], [1875, 255]]);
					}
				}
			}
			color(c = [0.9000000000, 0.6000000000, 0.6000000000]) {
				translate(v = [0, 0, 2176.1000000000]) {
					linear_extrude(height = 100.0000000000) {
						polygon(paths = [[0, 1, 2, 3, 4, 5, 6, 7]], points = [[2570, 255], [2570, 825], [2675, 825], [2675, 1495], [2570, 1495], [2570, 2465], [3135, 2465], [3135, 255]]);
					}
				}
			}
			color(c = [0.9000000000, 0.6000000000, 0.6000000000]) {
				translate(v = [0, 0, 2176.1000000000]) {
					linear_extrude(height = 100.0000000000) {
						polygon(paths = [[0, 1, 2, 3, 4, 5, 6, 7, 8, 9, 10, 11]], points = [[655, 2175], [655, 2635], [0, 2635], [0, 2805], [3220, 2805], [3220, 2635], [2400, 2635], [2400, 2175], [2075, 2175], [2075, 2635], [925, 2635], [925, 2175]]);
					}
				}
			}
			color(c = [0.5000000000, 0.5000000000, 0.5000000000]) {
				translate(v = [0, 0, 2276.1000000000]) {
					linear_extrude(height = 340.0000000000) {
						polygon(paths = [[0, 1, 2, 3]], points = [[145, -85], [145, 85], [315, 85], [315, -85]]);
					}
				}
			}
			color(c = [0.5000000000, 0.5000000000, 0.5000000000]) {
				translate(v = [0, 0, 2276.1000000000]) {
					linear_extrude(height = 340.0000000000) {
						polygon(paths = [[0, 1, 2, 3]], points = [[605, -85], [605, 85], [775, 85], [775, -85]]);
					}
				}
			}
			color(c = [0.5000000000, 0.5000000000, 0.5000000000]) {
				translate(v = [0, 0, 2276.1000000000]) {
					linear_extrude(height = 340.0000000000) {
						polygon(paths = [[0, 1, 2, 3]], points = [[1065, -85], [1065, 85], [1235, 85], [1235, -85]]);
					}
				}
			}
			color(c = [0.5000000000, 0.5000000000, 0.5000000000]) {
				translate(v = [0, 0, 2276.1000000000]) {
					linear_extrude(height = 340.0000000000) {
						polygon(paths = [[0, 1, 2, 3]], points = [[1525, -85], [1525, 85], [1695, 85], [1695, -85]]);
					}
				}
			}
			color(c = [0.5000000000, 0.5000000000, 0.5000000000]) {
				translate(v = [0, 0, 2276.1000000000]) {
					linear_extrude(height = 340.0000000000) {
						polygon(paths = [[0, 1, 2, 3]], points = [[1985, -85], [1985, 85], [2155, 85], [2155, -85]]);
					}
				}
			}
			color(c = [0.5000000000, 0.5000000000, 0.5000000000]) {
				translate(v = [0, 0, 2276.1000000000]) {
					linear_extrude(height = 340.0000000000) {
						polygon(paths = [[0, 1, 2, 3]], points = [[2445, -85], [2445, 85], [2615, 85], [2615, -85]]);
					}
				}
			}
			color(c = [0.5000000000, 0.5000000000, 0.5000000000]) {
				translate(v = [0, 0, 2276.1000000000]) {
					linear_extrude(height = 340.0000000000) {
						polygon(paths = [[0, 1, 2, 3]], points = [[2905, -85], [2905, 85], [3075, 85], [3075, -85]]);
					}
				}
			}
			color(c = [0.5000000000, 0.5000000000, 0.5000000000]) {
				translate(v = [0, 0, 2276.1000000000]) {
					linear_extrude(height = 340.0000000000) {
						polygon(paths = [[0, 1, 2, 3]], points = [[145, 2635], [145, 2805], [315, 2805], [315, 2635]]);
					}
				}
			}
			color(c = [0.5000000000, 0.5000000000, 0.5000000000]) {
				translate(v = [0, 0, 2276.1000000000]) {
					linear_extrude(height = 340.0000000000) {
						polygon(paths = [[0, 1, 2, 3]], points = [[605, 2635], [605, 2805], [775, 2805], [775, 2635]]);
					}
				}
			}
			color(c = [0.5000000000, 0.5000000000, 0.5000000000]) {
				translate(v = [0, 0, 2276.1000000000]) {
					linear_extrude(height = 340.0000000000) {
						polygon(paths = [[0, 1, 2, 3]], points = [[1065, 2635], [1065, 2805], [1235, 2805], [1235, 2635]]);
					}
				}
			}
			color(c = [0.5000000000, 0.5000000000, 0.5000000000]) {
				translate(v = [0, 0, 2276.1000000000]) {
					linear_extrude(height = 340.0000000000) {
						polygon(paths = [[0, 1, 2, 3]], points = [[1525, 2635], [1525, 2805], [1695, 2805], [1695, 2635]]);
					}
				}
			}
			color(c = [0.5000000000, 0.5000000000, 0.5000000000]) {
				translate(v = [0, 0, 2276.1000000000]) {
					linear_extrude(height = 340.0000000000) {
						polygon(paths = [[0, 1, 2, 3]], points = [[1985, 2635], [1985, 2805], [2155, 2805], [2155, 2635]]);
					}
				}
			}
			color(c = [0.5000000000, 0.5000000000, 0.5000000000]) {
				translate(v = [0, 0, 2276.1000000000]) {
					linear_extrude(height = 340.0000000000) {
						polygon(paths = [[0, 1, 2, 3]], points = [[2445, 2635], [2445, 2805], [2615, 2805], [2615, 2635]]);
					}
				}
			}
			color(c = [0.5000000000, 0.5000000000, 0.5000000000]) {
				translate(v = [0, 0, 2276.1000000000]) {
					linear_extrude(height = 340.0000000000) {
						polygon(paths = [[0, 1, 2, 3]], points = [[2905, 2635], [2905, 2805], [3075, 2805], [3075, 2635]]);
					}
				}
			}
			color(c = [0.3000000000, 0.3000000000, 1]) {
				translate(v = [0, 0, 2616.1000000000]) {
					linear_extrude(height = 360.0000000000) {
						polygon(paths = [[0, 1, 2, 3]], points = [[0, -240], [0, 240], [3220, 240], [3220, -240]]);
					}
				}
			}
			color(c = [0.3000000000, 0.3000000000, 1]) {
				translate(v = [0, 0, 2616.1000000000]) {
					linear_extrude(height = 360.0000000000) {
						polygon(paths = [[0, 1, 2, 3]], points = [[0, 2480], [0, 2960], [3220, 2960], [3220, 2480]]);
					}
				}
			}
		}
	}
}
